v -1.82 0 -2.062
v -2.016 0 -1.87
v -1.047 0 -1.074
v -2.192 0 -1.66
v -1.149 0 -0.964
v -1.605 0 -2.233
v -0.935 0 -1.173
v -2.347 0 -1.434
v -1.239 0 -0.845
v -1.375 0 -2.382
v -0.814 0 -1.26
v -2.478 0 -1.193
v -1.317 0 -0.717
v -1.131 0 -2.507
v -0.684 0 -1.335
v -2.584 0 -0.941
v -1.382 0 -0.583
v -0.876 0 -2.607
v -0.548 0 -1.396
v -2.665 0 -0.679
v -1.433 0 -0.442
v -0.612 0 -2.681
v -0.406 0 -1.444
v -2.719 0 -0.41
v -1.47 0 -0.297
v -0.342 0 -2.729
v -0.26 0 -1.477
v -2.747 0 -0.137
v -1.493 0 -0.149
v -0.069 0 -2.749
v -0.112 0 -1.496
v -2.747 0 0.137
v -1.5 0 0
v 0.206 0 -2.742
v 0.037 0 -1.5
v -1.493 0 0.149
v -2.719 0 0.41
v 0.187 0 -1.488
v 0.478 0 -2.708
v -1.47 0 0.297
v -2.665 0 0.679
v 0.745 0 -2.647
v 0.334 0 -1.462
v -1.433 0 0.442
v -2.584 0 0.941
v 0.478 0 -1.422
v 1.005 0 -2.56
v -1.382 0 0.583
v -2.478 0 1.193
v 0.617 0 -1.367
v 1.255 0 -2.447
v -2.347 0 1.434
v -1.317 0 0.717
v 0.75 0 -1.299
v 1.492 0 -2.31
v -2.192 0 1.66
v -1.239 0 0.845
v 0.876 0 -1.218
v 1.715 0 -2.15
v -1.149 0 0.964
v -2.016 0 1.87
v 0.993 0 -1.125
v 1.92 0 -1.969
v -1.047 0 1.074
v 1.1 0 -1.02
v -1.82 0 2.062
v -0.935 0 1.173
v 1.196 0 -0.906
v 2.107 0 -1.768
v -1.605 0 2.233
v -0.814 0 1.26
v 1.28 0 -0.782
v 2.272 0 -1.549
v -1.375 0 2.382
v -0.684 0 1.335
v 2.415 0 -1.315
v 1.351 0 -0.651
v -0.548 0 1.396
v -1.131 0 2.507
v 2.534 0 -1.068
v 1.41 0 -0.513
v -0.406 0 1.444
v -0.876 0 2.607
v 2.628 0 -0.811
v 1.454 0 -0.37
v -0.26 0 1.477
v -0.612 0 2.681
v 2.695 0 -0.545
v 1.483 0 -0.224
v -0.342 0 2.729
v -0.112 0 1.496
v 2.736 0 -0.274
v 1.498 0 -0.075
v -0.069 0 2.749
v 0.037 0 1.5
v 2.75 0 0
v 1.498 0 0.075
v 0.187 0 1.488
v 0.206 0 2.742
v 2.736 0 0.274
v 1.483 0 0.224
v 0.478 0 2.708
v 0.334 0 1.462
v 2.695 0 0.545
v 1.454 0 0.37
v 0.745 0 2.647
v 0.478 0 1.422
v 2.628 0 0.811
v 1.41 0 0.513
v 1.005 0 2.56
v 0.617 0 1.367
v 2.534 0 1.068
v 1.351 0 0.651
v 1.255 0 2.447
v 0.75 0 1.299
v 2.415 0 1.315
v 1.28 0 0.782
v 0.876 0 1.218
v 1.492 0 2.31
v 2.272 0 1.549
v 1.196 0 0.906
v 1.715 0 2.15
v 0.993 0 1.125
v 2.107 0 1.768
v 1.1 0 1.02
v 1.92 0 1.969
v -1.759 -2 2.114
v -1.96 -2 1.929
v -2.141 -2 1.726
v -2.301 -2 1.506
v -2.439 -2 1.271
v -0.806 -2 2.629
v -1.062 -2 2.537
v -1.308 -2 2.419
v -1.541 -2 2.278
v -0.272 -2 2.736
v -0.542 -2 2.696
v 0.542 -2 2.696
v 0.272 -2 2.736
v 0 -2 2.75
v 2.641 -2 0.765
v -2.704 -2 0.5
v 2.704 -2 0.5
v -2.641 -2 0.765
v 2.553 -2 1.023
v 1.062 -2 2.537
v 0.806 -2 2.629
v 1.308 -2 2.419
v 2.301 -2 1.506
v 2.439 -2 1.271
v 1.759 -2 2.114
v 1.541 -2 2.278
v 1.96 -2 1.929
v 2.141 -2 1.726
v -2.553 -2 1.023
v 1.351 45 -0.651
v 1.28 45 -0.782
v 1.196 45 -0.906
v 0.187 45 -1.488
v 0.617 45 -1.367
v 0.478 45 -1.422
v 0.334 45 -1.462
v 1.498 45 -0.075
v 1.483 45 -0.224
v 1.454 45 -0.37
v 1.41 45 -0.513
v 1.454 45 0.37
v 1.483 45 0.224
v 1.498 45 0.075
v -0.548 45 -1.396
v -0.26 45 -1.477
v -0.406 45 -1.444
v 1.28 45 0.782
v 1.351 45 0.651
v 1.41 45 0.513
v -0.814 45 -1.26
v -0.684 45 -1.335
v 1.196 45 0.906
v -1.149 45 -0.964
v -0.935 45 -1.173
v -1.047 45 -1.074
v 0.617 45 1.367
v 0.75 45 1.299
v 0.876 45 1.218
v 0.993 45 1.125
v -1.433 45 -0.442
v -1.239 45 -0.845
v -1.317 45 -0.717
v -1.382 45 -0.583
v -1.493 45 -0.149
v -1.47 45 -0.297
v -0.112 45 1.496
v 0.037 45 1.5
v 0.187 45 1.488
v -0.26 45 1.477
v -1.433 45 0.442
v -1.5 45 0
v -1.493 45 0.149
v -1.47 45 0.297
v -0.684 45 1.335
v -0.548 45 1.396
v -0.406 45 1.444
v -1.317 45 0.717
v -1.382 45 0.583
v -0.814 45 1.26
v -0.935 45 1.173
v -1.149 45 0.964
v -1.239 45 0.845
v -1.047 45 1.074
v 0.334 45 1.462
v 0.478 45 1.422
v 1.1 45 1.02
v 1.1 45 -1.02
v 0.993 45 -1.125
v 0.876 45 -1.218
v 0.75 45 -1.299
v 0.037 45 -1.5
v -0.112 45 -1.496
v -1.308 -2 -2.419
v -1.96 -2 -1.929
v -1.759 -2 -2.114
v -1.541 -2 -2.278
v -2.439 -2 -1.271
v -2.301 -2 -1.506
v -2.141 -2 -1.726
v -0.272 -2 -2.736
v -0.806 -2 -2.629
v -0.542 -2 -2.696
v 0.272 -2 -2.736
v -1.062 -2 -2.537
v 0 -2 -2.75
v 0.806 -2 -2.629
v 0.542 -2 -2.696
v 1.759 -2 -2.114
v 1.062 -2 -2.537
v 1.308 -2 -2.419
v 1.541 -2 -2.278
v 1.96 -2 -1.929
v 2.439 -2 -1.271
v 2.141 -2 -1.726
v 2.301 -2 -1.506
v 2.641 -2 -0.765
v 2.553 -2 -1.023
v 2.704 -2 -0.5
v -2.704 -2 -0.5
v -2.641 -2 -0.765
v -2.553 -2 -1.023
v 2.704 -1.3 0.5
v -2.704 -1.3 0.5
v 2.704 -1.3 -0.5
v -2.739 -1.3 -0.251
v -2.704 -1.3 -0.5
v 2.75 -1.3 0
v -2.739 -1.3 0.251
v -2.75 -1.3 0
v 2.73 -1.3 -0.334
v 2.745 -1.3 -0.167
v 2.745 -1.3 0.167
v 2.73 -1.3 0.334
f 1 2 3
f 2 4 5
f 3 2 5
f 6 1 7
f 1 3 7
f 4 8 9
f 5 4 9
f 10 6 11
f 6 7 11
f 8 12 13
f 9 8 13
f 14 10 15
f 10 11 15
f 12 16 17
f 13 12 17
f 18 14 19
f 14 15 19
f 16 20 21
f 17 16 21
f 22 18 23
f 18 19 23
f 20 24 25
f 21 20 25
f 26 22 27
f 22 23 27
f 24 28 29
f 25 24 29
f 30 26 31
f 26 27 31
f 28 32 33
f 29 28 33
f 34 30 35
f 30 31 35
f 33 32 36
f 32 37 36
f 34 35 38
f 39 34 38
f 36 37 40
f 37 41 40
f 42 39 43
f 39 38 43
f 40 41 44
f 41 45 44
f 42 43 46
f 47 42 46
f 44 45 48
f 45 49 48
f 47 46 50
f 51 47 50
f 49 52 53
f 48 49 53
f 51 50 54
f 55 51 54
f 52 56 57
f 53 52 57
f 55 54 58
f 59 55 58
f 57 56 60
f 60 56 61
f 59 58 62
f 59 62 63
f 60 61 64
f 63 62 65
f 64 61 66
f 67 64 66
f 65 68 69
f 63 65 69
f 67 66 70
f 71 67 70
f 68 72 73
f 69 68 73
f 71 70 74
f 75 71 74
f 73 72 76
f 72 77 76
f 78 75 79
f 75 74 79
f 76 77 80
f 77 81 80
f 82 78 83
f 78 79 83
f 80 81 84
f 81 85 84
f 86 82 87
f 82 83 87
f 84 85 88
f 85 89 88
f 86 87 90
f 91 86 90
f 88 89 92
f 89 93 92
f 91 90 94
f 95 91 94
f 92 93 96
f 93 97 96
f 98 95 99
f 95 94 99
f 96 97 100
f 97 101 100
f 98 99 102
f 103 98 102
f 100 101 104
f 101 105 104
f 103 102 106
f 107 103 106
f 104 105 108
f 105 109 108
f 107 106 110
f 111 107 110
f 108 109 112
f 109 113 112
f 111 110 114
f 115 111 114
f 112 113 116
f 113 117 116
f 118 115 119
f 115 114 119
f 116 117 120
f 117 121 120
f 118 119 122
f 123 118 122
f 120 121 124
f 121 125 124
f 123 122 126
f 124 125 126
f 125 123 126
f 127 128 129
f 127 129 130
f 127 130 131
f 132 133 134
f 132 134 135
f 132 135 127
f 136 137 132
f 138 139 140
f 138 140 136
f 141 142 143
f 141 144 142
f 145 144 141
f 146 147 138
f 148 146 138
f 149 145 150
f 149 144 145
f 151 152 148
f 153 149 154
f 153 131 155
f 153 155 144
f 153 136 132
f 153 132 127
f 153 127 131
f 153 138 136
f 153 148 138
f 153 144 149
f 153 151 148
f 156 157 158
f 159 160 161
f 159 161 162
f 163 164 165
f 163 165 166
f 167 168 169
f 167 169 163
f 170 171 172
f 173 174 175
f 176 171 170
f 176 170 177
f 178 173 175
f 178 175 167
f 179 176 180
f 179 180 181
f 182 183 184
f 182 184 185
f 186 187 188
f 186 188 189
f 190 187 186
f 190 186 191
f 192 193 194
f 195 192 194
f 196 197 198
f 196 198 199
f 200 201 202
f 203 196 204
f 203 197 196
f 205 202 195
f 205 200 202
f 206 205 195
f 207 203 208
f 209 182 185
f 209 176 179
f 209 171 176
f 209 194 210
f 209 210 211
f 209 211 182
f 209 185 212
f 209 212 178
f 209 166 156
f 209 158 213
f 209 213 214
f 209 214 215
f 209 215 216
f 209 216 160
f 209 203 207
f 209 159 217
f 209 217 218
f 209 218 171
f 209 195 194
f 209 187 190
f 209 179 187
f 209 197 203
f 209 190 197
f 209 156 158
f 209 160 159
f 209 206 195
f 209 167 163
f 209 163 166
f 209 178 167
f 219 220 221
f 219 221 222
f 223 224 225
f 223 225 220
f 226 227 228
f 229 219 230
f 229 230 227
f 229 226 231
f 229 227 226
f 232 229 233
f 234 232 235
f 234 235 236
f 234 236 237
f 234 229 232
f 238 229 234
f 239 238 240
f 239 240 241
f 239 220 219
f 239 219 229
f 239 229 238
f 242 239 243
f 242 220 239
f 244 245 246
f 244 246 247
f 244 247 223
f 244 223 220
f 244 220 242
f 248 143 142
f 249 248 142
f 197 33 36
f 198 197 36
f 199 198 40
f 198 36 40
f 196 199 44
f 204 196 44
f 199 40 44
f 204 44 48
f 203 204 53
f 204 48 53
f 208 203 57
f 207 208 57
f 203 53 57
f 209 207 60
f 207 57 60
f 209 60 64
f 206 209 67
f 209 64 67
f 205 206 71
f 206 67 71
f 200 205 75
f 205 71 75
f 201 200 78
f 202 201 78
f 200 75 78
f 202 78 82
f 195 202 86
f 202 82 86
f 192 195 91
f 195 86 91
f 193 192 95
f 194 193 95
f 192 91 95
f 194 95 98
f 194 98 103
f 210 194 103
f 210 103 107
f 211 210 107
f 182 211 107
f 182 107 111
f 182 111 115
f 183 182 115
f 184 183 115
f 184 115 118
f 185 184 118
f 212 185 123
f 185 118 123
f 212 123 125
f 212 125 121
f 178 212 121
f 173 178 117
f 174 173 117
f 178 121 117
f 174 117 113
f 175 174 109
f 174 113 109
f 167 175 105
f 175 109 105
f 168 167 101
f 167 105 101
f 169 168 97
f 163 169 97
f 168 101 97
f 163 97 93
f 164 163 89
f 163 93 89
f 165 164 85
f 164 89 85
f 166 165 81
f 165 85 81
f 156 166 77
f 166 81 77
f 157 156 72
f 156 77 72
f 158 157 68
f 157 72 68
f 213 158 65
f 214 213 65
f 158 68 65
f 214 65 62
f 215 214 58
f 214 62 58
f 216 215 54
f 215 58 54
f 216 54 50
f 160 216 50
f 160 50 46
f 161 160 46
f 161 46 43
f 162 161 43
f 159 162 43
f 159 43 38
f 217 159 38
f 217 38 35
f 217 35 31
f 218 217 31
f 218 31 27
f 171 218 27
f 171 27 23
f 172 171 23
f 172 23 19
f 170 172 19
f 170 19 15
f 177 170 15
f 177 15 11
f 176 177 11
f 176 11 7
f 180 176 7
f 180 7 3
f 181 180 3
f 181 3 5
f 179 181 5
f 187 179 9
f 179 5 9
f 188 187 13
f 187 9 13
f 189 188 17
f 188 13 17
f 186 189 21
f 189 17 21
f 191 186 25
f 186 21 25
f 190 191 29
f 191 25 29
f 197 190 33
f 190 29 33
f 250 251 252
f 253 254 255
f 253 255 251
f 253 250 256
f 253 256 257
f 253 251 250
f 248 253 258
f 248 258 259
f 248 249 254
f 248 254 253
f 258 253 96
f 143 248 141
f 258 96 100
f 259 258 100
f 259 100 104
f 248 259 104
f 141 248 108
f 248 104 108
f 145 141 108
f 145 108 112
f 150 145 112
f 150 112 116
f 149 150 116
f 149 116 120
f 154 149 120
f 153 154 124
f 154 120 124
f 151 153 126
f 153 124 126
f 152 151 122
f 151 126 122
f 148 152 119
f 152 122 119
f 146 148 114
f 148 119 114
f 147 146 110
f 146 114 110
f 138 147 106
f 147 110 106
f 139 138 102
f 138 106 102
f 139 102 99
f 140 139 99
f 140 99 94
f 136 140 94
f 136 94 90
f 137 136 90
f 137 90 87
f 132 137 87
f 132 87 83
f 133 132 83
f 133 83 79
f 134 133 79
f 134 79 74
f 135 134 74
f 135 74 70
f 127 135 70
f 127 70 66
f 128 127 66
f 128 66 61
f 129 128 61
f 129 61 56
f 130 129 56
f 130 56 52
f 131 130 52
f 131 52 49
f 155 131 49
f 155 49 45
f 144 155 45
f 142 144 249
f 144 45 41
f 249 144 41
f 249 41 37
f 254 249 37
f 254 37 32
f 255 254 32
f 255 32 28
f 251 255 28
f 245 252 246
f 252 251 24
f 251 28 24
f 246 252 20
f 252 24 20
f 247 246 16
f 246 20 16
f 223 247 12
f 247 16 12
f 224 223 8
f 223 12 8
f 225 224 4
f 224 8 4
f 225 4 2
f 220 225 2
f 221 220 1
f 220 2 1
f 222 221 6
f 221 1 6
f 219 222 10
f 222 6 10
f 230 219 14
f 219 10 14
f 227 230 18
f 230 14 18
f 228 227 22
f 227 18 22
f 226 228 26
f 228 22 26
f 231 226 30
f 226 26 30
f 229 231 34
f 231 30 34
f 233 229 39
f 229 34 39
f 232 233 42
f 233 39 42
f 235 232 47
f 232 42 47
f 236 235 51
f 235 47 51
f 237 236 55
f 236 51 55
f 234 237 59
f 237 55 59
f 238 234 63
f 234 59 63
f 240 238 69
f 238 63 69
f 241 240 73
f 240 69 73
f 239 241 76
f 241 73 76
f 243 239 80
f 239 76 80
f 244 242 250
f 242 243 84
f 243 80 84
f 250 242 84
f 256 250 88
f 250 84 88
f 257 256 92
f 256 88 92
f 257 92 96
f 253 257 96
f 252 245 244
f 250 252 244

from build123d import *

# Parameters (mm, degrees)
F0_R     = 2.75
F1_DEPTH = 2
F3_DEPTH = 0.7
F4_R     = 1.5
F5_DEPTH = 45


with BuildPart() as f1:
    # F0 (on Front) → F1 (new body)
    with BuildSketch(Plane.XZ):
        Circle(F0_R)
    extrude(amount=F1_DEPTH)

    # F2 (on face) → F3 (cut)
    with BuildSketch(Plane.XZ.offset(2)):
        with BuildLine():
            ThreePointArc((2.75, 0), (2.7385168893, 0.2510482965), (2.7041634566, 0.5))
            Line((2.7041634566, 0.5), (-2.7041634566, 0.5))
            ThreePointArc((-2.7041634566, 0.5), (-2.75, 0), (-2.7041634566, -0.5))
            Line((-2.7041634566, -0.5), (2.7041634566, -0.5))
            ThreePointArc((2.7041634566, -0.5), (2.7385168893, -0.2510482965), (2.75, 0))
        make_face()
    extrude(amount=-F3_DEPTH, mode=Mode.SUBTRACT)

    # F4 (on face) → F5 (join)
    with BuildSketch(Plane(origin=(0, 0, 0), x_dir=(-1, 0, 0), z_dir=(0, 1, 0))):
        Circle(F4_R)
    extrude(amount=F5_DEPTH)


solid = f1.part
